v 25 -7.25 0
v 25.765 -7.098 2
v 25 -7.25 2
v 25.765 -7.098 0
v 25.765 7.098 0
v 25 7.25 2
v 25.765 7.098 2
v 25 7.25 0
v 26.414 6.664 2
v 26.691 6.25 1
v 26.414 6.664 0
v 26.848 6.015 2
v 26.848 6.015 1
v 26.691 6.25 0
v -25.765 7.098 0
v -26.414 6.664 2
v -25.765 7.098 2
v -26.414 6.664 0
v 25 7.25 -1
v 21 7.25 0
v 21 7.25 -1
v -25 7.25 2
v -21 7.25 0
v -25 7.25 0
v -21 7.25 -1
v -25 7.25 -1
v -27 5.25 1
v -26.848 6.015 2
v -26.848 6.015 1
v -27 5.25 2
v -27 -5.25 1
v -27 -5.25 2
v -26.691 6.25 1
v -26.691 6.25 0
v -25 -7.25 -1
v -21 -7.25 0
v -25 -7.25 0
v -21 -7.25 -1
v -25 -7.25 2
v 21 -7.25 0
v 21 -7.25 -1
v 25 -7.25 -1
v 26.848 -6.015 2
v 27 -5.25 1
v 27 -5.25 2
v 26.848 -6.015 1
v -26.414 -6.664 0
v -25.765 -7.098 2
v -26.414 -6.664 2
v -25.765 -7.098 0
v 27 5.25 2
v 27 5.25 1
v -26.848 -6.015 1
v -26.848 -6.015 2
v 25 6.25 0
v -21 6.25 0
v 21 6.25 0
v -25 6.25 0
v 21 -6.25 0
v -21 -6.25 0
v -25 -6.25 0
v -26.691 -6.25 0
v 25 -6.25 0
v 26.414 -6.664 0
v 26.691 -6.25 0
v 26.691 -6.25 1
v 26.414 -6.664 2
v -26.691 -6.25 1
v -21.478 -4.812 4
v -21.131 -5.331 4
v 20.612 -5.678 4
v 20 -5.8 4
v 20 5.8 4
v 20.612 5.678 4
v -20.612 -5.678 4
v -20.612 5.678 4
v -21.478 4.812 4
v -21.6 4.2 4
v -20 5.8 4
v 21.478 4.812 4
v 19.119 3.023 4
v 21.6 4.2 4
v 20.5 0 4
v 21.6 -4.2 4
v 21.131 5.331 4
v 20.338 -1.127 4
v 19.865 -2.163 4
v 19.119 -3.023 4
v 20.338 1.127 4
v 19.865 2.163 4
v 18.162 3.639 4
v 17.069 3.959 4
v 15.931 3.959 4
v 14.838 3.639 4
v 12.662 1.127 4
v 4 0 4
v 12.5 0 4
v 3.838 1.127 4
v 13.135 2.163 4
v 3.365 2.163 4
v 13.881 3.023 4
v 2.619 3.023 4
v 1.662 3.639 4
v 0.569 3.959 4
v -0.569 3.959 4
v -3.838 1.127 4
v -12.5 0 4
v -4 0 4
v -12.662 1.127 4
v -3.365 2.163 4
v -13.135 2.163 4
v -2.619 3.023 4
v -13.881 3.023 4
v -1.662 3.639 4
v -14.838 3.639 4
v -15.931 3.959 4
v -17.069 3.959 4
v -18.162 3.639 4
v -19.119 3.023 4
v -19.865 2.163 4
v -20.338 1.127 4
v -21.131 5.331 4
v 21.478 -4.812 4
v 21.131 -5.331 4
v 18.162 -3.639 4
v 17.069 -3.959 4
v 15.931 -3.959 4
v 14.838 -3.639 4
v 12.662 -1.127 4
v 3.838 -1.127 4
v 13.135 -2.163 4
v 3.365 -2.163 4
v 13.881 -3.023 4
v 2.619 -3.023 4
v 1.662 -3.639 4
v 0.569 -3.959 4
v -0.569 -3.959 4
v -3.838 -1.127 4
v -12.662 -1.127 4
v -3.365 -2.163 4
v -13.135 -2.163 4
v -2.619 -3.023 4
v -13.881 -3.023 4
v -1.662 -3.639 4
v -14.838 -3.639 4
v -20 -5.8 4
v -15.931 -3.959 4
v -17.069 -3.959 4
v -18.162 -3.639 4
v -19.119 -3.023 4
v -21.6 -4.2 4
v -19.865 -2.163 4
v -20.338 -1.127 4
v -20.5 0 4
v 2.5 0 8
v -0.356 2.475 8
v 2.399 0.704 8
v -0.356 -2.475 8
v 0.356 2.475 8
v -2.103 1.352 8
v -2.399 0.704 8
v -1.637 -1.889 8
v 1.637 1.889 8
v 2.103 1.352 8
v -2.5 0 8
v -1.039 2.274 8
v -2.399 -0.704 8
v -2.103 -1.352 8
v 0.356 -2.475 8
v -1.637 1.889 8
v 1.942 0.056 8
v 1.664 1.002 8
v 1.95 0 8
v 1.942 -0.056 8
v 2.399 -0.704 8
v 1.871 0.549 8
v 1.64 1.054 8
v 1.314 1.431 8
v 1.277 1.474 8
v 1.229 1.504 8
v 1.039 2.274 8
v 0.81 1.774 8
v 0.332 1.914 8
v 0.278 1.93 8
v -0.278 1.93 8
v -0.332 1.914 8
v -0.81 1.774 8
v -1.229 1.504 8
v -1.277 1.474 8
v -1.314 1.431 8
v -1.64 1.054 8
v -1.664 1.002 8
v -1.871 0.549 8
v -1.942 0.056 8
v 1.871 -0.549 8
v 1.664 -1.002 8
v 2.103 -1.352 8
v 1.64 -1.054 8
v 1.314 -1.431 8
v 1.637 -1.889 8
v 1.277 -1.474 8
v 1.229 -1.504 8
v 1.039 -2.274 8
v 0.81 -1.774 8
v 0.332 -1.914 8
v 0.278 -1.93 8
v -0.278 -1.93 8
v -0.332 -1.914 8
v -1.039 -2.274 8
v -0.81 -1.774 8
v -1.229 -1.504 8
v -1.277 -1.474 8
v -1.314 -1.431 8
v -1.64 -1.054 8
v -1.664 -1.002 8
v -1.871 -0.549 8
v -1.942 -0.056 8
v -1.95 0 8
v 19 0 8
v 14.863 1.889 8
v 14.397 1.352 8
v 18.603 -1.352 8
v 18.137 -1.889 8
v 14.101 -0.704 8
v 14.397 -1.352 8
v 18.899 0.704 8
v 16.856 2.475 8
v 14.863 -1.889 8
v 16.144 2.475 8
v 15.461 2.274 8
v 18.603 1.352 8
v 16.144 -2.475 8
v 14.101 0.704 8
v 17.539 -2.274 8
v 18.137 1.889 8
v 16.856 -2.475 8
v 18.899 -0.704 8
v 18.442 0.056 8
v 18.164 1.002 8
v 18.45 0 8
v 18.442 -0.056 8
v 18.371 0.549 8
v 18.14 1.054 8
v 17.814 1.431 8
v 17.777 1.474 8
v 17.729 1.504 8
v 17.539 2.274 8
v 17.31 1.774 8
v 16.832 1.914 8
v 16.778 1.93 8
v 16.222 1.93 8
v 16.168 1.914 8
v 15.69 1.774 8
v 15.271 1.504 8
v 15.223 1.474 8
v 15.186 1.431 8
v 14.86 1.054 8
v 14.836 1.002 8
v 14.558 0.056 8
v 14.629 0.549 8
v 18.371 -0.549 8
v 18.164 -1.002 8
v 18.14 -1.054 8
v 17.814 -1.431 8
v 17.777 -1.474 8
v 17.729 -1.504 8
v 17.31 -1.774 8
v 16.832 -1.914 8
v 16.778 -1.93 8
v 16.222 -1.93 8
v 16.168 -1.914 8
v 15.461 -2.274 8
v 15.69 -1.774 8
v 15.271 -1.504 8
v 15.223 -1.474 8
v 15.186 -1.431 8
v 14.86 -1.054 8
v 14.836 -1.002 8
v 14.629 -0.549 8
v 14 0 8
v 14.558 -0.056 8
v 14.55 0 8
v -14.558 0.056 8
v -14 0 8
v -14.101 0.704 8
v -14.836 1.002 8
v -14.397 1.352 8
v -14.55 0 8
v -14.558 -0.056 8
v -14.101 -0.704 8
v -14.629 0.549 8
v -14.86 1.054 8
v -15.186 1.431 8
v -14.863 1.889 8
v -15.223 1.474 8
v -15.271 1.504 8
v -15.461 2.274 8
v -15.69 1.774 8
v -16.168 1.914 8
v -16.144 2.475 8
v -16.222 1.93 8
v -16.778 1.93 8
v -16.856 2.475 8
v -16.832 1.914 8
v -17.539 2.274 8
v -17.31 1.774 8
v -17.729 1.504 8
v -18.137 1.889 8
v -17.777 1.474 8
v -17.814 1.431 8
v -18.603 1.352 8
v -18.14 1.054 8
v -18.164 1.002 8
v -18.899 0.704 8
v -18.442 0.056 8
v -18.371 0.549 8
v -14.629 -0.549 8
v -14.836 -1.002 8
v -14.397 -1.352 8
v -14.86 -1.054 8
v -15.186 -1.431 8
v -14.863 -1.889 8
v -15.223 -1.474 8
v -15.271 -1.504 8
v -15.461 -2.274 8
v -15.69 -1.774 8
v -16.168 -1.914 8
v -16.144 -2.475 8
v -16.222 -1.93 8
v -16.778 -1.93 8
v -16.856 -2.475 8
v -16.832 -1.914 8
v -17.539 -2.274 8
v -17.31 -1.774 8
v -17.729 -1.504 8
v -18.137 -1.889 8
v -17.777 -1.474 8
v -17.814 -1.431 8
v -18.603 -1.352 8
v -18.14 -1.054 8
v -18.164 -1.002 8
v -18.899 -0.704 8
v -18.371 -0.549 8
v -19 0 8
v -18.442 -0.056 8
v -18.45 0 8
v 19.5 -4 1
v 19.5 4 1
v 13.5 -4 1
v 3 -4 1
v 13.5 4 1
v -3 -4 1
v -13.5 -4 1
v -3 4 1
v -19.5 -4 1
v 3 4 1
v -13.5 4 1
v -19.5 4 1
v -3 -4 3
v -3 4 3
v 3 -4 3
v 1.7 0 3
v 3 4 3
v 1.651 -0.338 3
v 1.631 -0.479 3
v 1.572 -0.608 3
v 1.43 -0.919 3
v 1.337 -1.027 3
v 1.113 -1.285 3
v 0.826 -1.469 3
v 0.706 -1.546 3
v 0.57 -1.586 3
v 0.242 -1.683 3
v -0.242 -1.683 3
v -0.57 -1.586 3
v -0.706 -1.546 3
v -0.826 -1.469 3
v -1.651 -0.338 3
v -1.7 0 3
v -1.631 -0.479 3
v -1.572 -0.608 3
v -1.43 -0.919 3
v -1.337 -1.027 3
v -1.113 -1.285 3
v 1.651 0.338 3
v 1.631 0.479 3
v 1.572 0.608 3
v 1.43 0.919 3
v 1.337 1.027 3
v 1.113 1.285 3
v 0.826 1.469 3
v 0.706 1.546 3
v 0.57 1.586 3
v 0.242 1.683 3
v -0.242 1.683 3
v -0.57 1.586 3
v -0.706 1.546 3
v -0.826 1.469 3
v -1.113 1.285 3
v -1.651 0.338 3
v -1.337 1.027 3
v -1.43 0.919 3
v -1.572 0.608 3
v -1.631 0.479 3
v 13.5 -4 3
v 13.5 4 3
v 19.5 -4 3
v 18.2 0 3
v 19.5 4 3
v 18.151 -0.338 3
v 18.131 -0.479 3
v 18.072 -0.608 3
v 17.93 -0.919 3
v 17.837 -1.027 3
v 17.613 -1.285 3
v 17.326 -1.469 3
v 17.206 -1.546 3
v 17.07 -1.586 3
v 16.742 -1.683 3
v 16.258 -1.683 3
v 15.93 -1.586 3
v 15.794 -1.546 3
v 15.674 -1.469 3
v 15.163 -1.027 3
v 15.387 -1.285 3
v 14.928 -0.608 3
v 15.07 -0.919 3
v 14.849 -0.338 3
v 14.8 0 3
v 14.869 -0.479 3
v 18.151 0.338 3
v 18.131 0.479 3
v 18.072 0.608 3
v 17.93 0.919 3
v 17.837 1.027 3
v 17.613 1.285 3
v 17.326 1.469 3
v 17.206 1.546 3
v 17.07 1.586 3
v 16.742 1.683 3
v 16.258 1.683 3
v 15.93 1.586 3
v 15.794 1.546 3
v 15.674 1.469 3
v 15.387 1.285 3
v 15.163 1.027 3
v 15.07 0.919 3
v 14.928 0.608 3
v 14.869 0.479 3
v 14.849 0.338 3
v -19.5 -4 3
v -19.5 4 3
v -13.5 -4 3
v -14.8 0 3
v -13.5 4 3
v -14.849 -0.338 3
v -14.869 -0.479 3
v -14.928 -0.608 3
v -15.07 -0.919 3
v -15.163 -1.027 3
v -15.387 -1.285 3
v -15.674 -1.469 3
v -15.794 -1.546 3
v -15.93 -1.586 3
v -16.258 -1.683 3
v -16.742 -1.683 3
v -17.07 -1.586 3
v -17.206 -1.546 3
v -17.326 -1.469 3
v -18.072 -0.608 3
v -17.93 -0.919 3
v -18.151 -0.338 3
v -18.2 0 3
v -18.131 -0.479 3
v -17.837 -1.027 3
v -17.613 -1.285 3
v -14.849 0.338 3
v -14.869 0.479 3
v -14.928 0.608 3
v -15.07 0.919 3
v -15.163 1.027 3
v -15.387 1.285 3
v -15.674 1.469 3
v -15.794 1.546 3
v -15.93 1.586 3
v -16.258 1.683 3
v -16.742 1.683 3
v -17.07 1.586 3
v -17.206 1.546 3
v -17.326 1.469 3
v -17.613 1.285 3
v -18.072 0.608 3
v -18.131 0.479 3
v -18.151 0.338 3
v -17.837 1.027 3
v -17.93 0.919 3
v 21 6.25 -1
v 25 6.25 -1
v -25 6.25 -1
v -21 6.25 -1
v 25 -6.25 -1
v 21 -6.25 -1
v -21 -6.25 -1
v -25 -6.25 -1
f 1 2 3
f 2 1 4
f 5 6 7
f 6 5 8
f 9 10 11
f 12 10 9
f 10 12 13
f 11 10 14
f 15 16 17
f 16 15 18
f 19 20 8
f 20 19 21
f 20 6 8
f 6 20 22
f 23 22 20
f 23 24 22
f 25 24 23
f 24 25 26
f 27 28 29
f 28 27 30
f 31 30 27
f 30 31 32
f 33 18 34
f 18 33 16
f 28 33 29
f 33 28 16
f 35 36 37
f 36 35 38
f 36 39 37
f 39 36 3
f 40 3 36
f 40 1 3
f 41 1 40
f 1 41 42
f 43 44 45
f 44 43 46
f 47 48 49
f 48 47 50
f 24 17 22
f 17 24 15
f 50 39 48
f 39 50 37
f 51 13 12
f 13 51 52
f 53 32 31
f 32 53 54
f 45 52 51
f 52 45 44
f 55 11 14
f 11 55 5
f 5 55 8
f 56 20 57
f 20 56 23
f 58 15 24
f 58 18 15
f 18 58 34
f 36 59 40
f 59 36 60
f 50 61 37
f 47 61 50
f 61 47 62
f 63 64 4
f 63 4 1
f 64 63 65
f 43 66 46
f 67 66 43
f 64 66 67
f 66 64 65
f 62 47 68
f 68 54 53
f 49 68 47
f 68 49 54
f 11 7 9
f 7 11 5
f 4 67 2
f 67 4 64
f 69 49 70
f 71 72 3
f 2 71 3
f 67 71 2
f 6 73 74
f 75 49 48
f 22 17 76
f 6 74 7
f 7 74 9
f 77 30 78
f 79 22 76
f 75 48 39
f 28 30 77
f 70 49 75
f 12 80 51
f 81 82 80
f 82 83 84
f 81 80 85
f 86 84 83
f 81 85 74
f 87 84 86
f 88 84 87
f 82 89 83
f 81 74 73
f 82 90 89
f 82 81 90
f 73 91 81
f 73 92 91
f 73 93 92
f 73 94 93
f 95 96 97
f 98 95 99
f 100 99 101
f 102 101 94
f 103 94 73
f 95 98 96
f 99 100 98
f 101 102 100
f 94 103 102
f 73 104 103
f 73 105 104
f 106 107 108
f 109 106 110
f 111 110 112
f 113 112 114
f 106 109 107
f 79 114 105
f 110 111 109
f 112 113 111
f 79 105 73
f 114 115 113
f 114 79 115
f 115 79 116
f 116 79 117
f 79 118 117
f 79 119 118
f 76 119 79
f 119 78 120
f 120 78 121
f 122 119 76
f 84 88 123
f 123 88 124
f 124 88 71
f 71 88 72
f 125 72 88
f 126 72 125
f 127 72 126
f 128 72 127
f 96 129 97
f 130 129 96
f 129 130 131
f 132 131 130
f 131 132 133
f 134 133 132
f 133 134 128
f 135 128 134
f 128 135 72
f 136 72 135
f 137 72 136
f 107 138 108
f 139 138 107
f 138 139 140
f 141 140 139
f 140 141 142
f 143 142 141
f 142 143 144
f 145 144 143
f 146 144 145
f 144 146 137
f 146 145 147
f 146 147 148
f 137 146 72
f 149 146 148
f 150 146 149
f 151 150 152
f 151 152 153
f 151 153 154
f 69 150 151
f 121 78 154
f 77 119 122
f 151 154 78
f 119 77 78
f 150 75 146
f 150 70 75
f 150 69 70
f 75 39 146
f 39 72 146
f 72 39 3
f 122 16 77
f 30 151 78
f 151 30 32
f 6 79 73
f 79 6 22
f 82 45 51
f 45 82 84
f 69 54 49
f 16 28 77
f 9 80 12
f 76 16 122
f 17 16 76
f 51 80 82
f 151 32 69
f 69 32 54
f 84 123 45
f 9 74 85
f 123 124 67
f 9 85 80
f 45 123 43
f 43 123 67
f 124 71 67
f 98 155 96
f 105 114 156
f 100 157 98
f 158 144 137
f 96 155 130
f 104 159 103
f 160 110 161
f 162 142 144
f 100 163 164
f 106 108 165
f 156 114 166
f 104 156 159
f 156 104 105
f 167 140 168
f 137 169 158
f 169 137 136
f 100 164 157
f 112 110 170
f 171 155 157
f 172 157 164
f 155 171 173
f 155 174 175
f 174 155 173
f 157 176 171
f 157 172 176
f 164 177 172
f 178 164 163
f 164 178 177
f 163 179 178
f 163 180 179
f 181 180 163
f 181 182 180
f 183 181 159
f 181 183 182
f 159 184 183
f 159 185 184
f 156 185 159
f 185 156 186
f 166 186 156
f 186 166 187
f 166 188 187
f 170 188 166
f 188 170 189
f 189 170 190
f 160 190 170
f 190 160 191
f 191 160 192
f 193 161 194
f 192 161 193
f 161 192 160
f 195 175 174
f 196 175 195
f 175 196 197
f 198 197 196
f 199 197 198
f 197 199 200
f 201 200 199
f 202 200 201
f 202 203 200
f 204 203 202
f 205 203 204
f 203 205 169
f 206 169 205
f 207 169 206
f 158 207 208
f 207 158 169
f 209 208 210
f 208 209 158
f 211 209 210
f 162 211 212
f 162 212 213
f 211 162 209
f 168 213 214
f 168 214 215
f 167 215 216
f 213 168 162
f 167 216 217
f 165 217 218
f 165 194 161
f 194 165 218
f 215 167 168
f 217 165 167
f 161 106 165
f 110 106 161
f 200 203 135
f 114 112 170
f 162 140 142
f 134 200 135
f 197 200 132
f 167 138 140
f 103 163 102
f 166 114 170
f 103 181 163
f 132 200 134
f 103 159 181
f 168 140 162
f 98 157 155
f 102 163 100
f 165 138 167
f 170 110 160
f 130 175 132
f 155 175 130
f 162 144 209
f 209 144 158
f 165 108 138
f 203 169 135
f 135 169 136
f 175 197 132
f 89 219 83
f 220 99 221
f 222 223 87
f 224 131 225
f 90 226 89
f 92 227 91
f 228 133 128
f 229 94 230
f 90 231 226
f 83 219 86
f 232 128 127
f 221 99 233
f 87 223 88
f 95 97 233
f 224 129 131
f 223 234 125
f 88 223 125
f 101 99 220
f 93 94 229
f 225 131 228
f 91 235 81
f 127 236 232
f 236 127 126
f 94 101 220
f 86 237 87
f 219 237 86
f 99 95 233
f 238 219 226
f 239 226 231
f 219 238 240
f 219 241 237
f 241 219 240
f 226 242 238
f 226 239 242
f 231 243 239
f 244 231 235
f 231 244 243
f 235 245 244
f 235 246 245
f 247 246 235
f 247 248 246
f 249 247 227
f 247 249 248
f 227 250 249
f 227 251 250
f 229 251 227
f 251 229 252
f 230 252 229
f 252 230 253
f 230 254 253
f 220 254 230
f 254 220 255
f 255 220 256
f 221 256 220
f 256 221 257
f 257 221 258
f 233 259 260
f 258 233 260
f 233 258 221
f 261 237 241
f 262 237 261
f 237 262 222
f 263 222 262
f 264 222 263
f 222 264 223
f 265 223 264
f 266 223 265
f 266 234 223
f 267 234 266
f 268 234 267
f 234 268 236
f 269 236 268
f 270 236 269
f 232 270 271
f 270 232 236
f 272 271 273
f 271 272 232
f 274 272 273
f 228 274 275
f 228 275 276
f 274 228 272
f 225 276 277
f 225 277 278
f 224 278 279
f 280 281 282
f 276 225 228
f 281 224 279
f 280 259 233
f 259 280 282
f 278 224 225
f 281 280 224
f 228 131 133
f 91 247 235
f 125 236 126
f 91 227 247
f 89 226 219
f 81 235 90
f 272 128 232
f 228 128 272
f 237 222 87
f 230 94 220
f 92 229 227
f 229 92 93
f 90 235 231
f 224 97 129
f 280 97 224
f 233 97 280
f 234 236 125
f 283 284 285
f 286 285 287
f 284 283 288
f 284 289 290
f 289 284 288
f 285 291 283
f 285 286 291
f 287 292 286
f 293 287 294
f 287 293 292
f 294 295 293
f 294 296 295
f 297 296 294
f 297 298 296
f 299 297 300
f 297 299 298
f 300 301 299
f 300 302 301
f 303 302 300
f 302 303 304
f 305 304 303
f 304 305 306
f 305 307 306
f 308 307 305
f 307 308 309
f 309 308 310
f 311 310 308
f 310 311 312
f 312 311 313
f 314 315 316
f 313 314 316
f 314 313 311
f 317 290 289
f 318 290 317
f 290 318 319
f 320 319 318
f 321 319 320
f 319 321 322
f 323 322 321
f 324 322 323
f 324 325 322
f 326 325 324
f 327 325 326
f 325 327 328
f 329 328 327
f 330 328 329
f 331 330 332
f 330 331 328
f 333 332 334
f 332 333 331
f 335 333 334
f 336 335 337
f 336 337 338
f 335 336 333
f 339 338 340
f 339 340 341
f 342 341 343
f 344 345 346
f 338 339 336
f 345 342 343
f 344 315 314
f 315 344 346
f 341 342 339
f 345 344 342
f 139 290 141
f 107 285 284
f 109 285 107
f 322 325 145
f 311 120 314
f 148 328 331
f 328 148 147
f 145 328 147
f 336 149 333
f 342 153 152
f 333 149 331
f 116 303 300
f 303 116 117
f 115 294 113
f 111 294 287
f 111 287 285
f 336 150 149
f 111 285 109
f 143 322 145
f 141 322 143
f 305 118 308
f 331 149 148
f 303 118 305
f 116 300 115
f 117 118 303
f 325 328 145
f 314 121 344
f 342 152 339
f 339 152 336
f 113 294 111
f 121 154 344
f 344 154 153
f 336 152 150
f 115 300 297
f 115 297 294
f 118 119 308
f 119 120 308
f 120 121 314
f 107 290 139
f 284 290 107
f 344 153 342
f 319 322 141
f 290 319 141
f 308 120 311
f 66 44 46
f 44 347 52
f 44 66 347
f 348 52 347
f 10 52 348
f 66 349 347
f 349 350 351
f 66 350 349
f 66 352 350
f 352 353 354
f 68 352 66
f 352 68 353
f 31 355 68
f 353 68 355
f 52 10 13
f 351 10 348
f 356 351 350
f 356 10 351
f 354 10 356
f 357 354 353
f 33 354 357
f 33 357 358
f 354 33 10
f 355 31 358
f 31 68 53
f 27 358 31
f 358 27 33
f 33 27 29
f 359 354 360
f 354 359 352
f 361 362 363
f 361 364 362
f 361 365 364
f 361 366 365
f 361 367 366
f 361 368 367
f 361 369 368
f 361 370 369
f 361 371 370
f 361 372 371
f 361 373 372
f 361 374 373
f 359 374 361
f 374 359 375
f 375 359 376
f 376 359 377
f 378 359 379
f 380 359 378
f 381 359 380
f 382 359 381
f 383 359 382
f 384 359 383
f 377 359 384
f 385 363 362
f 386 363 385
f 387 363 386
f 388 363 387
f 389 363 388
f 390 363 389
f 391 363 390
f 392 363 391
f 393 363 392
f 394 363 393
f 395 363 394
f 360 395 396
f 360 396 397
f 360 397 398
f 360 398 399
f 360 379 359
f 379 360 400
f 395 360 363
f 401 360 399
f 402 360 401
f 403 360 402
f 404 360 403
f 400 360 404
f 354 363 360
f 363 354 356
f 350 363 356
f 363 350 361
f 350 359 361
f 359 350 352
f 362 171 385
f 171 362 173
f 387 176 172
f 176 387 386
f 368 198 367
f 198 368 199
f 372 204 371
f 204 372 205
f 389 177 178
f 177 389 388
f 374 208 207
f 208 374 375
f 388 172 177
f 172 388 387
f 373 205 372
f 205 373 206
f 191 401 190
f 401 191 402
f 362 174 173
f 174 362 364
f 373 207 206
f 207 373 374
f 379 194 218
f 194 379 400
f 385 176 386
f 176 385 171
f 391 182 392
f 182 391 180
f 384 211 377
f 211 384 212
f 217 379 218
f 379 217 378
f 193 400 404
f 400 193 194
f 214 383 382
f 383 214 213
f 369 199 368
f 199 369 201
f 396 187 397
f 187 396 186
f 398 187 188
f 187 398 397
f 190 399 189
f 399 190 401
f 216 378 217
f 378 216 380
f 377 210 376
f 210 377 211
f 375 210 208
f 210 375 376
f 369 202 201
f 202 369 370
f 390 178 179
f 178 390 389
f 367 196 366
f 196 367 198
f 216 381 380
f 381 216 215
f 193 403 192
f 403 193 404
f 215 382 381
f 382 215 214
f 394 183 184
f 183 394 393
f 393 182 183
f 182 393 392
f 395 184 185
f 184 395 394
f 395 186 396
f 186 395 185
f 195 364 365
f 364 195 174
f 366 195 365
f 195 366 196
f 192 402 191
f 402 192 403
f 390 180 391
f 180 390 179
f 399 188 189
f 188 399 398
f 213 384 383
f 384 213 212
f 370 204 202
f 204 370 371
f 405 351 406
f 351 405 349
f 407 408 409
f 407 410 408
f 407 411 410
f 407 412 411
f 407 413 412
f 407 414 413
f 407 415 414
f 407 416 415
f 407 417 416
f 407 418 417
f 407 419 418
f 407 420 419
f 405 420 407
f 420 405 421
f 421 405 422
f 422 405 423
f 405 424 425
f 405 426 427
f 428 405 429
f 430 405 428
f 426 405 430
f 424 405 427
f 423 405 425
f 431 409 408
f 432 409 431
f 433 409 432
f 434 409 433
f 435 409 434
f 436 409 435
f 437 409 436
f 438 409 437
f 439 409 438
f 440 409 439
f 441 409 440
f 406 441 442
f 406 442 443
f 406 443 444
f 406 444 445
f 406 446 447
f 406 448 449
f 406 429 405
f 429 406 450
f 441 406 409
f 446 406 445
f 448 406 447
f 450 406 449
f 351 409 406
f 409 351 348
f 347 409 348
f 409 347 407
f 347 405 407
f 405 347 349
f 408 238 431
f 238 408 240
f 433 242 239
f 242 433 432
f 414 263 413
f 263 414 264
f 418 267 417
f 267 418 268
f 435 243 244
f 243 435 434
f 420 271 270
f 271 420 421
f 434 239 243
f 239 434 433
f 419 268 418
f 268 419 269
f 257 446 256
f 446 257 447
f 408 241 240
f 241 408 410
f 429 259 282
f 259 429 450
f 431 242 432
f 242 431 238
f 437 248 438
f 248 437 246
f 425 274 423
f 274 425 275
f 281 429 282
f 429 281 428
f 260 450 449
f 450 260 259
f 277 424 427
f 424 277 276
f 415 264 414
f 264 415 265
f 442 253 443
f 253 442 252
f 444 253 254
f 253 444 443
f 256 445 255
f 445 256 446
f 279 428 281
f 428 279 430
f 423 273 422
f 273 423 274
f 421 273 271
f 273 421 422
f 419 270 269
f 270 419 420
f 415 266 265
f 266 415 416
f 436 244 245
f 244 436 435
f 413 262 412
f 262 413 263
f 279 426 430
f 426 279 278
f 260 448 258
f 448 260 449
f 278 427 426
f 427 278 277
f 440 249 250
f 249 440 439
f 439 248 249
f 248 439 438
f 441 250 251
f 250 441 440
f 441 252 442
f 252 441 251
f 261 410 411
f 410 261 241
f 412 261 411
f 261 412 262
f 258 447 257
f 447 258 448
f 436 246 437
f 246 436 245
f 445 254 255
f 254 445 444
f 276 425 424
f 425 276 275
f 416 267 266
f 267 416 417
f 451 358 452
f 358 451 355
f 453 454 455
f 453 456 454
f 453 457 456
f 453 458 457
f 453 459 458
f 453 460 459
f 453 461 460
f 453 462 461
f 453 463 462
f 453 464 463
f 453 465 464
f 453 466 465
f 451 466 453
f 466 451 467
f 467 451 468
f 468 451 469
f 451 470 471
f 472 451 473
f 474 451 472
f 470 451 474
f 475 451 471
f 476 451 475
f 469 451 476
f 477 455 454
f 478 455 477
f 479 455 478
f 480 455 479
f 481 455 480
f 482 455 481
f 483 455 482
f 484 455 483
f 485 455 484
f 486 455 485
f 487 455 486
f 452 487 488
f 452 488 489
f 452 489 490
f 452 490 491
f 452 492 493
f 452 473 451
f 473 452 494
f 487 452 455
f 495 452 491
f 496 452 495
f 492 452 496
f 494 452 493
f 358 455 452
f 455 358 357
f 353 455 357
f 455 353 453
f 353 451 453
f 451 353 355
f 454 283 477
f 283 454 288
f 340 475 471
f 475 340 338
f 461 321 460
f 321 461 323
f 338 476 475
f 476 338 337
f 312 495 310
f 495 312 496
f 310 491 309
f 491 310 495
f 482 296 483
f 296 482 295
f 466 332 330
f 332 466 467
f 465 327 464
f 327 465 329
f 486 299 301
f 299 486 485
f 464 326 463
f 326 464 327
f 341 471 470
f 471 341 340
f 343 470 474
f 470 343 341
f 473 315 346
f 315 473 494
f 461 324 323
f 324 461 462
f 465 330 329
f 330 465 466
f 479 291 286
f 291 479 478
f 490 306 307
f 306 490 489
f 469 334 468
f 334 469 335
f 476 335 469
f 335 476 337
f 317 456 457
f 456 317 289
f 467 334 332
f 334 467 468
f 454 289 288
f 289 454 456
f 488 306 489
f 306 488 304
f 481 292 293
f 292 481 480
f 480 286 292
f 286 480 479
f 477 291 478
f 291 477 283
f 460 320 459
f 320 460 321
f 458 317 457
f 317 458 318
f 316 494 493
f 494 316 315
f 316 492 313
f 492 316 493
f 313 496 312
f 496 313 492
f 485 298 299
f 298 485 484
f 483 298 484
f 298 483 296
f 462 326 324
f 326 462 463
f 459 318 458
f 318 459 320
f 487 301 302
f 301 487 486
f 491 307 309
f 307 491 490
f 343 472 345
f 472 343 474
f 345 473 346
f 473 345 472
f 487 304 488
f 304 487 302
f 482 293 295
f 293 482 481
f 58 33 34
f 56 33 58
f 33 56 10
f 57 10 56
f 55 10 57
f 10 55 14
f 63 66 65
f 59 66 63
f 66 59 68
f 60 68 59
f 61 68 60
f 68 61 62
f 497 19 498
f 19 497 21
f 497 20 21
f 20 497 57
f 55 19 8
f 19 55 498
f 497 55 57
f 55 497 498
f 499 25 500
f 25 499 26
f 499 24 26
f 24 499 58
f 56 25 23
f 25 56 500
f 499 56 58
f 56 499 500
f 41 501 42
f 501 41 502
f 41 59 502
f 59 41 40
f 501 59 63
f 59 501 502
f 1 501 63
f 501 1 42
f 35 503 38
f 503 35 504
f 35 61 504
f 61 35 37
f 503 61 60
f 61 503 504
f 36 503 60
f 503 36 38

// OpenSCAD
difference(){
    union(){
        // Main bar
        linear_extrude(height=2,scale=1) 
        offset(r=2,$fn=16) offset(r=-2,$fn=16)
        square(size=[54,14.5],center=true);

        translate([0,0,2])    
        linear_extrude(height=2,scale=0.8) 
        offset(r=2,$fn=16) offset(r=-2,$fn=16)
        square(size=[54,14.5],center=true);
        
    translate([0,0,4]) cylinder(r1=4,r2=2.5,h=4,$fn=22);
    translate([16.5,0,4]) cylinder(r1=4,r2=2.5,h=4,$fn=22);
    translate([-16.5,0,4]) cylinder(r1=4,r2=2.5,h=4,$fn=22);
    
    }
    
    // Channel for tape
    translate([0,0,0])
    linear_extrude(height=1) square(size=[54,12.5],center=true);
    
    // Cutouts for LED bodies
    translate([0,0,1]){
        linear_extrude(height=2) square(size=[6,8],center=true);
        cylinder(r1=1.6,r2=2,h=8,$fn=22);
    }
    
    translate([16.5,0,1]){
        linear_extrude(height=2) square(size=[6,8],center=true);
        cylinder(r1=1.6,r2=2,h=8,$fn=22);
    }

    translate([-16.5,0,1]){
        linear_extrude(height=2) square(size=[6,8],center=true);
        cylinder(r1=1.6,r2=2,h=8,$fn=22);
    }

}

// Add tabs
    translate([23,6.75,-1]) color("orange")
    linear_extrude(height=1) square(size=[4,1],center=true);
    translate([-23,6.75,-1]) color("orange")
    linear_extrude(height=1) square(size=[4,1],center=true);
    translate([23,-6.75,-1]) color("orange")
    linear_extrude(height=1) square(size=[4,1],center=true);
    translate([-23,-6.75,-1]) color("orange")
    linear_extrude(height=1) square(size=[4,1],center=true);
